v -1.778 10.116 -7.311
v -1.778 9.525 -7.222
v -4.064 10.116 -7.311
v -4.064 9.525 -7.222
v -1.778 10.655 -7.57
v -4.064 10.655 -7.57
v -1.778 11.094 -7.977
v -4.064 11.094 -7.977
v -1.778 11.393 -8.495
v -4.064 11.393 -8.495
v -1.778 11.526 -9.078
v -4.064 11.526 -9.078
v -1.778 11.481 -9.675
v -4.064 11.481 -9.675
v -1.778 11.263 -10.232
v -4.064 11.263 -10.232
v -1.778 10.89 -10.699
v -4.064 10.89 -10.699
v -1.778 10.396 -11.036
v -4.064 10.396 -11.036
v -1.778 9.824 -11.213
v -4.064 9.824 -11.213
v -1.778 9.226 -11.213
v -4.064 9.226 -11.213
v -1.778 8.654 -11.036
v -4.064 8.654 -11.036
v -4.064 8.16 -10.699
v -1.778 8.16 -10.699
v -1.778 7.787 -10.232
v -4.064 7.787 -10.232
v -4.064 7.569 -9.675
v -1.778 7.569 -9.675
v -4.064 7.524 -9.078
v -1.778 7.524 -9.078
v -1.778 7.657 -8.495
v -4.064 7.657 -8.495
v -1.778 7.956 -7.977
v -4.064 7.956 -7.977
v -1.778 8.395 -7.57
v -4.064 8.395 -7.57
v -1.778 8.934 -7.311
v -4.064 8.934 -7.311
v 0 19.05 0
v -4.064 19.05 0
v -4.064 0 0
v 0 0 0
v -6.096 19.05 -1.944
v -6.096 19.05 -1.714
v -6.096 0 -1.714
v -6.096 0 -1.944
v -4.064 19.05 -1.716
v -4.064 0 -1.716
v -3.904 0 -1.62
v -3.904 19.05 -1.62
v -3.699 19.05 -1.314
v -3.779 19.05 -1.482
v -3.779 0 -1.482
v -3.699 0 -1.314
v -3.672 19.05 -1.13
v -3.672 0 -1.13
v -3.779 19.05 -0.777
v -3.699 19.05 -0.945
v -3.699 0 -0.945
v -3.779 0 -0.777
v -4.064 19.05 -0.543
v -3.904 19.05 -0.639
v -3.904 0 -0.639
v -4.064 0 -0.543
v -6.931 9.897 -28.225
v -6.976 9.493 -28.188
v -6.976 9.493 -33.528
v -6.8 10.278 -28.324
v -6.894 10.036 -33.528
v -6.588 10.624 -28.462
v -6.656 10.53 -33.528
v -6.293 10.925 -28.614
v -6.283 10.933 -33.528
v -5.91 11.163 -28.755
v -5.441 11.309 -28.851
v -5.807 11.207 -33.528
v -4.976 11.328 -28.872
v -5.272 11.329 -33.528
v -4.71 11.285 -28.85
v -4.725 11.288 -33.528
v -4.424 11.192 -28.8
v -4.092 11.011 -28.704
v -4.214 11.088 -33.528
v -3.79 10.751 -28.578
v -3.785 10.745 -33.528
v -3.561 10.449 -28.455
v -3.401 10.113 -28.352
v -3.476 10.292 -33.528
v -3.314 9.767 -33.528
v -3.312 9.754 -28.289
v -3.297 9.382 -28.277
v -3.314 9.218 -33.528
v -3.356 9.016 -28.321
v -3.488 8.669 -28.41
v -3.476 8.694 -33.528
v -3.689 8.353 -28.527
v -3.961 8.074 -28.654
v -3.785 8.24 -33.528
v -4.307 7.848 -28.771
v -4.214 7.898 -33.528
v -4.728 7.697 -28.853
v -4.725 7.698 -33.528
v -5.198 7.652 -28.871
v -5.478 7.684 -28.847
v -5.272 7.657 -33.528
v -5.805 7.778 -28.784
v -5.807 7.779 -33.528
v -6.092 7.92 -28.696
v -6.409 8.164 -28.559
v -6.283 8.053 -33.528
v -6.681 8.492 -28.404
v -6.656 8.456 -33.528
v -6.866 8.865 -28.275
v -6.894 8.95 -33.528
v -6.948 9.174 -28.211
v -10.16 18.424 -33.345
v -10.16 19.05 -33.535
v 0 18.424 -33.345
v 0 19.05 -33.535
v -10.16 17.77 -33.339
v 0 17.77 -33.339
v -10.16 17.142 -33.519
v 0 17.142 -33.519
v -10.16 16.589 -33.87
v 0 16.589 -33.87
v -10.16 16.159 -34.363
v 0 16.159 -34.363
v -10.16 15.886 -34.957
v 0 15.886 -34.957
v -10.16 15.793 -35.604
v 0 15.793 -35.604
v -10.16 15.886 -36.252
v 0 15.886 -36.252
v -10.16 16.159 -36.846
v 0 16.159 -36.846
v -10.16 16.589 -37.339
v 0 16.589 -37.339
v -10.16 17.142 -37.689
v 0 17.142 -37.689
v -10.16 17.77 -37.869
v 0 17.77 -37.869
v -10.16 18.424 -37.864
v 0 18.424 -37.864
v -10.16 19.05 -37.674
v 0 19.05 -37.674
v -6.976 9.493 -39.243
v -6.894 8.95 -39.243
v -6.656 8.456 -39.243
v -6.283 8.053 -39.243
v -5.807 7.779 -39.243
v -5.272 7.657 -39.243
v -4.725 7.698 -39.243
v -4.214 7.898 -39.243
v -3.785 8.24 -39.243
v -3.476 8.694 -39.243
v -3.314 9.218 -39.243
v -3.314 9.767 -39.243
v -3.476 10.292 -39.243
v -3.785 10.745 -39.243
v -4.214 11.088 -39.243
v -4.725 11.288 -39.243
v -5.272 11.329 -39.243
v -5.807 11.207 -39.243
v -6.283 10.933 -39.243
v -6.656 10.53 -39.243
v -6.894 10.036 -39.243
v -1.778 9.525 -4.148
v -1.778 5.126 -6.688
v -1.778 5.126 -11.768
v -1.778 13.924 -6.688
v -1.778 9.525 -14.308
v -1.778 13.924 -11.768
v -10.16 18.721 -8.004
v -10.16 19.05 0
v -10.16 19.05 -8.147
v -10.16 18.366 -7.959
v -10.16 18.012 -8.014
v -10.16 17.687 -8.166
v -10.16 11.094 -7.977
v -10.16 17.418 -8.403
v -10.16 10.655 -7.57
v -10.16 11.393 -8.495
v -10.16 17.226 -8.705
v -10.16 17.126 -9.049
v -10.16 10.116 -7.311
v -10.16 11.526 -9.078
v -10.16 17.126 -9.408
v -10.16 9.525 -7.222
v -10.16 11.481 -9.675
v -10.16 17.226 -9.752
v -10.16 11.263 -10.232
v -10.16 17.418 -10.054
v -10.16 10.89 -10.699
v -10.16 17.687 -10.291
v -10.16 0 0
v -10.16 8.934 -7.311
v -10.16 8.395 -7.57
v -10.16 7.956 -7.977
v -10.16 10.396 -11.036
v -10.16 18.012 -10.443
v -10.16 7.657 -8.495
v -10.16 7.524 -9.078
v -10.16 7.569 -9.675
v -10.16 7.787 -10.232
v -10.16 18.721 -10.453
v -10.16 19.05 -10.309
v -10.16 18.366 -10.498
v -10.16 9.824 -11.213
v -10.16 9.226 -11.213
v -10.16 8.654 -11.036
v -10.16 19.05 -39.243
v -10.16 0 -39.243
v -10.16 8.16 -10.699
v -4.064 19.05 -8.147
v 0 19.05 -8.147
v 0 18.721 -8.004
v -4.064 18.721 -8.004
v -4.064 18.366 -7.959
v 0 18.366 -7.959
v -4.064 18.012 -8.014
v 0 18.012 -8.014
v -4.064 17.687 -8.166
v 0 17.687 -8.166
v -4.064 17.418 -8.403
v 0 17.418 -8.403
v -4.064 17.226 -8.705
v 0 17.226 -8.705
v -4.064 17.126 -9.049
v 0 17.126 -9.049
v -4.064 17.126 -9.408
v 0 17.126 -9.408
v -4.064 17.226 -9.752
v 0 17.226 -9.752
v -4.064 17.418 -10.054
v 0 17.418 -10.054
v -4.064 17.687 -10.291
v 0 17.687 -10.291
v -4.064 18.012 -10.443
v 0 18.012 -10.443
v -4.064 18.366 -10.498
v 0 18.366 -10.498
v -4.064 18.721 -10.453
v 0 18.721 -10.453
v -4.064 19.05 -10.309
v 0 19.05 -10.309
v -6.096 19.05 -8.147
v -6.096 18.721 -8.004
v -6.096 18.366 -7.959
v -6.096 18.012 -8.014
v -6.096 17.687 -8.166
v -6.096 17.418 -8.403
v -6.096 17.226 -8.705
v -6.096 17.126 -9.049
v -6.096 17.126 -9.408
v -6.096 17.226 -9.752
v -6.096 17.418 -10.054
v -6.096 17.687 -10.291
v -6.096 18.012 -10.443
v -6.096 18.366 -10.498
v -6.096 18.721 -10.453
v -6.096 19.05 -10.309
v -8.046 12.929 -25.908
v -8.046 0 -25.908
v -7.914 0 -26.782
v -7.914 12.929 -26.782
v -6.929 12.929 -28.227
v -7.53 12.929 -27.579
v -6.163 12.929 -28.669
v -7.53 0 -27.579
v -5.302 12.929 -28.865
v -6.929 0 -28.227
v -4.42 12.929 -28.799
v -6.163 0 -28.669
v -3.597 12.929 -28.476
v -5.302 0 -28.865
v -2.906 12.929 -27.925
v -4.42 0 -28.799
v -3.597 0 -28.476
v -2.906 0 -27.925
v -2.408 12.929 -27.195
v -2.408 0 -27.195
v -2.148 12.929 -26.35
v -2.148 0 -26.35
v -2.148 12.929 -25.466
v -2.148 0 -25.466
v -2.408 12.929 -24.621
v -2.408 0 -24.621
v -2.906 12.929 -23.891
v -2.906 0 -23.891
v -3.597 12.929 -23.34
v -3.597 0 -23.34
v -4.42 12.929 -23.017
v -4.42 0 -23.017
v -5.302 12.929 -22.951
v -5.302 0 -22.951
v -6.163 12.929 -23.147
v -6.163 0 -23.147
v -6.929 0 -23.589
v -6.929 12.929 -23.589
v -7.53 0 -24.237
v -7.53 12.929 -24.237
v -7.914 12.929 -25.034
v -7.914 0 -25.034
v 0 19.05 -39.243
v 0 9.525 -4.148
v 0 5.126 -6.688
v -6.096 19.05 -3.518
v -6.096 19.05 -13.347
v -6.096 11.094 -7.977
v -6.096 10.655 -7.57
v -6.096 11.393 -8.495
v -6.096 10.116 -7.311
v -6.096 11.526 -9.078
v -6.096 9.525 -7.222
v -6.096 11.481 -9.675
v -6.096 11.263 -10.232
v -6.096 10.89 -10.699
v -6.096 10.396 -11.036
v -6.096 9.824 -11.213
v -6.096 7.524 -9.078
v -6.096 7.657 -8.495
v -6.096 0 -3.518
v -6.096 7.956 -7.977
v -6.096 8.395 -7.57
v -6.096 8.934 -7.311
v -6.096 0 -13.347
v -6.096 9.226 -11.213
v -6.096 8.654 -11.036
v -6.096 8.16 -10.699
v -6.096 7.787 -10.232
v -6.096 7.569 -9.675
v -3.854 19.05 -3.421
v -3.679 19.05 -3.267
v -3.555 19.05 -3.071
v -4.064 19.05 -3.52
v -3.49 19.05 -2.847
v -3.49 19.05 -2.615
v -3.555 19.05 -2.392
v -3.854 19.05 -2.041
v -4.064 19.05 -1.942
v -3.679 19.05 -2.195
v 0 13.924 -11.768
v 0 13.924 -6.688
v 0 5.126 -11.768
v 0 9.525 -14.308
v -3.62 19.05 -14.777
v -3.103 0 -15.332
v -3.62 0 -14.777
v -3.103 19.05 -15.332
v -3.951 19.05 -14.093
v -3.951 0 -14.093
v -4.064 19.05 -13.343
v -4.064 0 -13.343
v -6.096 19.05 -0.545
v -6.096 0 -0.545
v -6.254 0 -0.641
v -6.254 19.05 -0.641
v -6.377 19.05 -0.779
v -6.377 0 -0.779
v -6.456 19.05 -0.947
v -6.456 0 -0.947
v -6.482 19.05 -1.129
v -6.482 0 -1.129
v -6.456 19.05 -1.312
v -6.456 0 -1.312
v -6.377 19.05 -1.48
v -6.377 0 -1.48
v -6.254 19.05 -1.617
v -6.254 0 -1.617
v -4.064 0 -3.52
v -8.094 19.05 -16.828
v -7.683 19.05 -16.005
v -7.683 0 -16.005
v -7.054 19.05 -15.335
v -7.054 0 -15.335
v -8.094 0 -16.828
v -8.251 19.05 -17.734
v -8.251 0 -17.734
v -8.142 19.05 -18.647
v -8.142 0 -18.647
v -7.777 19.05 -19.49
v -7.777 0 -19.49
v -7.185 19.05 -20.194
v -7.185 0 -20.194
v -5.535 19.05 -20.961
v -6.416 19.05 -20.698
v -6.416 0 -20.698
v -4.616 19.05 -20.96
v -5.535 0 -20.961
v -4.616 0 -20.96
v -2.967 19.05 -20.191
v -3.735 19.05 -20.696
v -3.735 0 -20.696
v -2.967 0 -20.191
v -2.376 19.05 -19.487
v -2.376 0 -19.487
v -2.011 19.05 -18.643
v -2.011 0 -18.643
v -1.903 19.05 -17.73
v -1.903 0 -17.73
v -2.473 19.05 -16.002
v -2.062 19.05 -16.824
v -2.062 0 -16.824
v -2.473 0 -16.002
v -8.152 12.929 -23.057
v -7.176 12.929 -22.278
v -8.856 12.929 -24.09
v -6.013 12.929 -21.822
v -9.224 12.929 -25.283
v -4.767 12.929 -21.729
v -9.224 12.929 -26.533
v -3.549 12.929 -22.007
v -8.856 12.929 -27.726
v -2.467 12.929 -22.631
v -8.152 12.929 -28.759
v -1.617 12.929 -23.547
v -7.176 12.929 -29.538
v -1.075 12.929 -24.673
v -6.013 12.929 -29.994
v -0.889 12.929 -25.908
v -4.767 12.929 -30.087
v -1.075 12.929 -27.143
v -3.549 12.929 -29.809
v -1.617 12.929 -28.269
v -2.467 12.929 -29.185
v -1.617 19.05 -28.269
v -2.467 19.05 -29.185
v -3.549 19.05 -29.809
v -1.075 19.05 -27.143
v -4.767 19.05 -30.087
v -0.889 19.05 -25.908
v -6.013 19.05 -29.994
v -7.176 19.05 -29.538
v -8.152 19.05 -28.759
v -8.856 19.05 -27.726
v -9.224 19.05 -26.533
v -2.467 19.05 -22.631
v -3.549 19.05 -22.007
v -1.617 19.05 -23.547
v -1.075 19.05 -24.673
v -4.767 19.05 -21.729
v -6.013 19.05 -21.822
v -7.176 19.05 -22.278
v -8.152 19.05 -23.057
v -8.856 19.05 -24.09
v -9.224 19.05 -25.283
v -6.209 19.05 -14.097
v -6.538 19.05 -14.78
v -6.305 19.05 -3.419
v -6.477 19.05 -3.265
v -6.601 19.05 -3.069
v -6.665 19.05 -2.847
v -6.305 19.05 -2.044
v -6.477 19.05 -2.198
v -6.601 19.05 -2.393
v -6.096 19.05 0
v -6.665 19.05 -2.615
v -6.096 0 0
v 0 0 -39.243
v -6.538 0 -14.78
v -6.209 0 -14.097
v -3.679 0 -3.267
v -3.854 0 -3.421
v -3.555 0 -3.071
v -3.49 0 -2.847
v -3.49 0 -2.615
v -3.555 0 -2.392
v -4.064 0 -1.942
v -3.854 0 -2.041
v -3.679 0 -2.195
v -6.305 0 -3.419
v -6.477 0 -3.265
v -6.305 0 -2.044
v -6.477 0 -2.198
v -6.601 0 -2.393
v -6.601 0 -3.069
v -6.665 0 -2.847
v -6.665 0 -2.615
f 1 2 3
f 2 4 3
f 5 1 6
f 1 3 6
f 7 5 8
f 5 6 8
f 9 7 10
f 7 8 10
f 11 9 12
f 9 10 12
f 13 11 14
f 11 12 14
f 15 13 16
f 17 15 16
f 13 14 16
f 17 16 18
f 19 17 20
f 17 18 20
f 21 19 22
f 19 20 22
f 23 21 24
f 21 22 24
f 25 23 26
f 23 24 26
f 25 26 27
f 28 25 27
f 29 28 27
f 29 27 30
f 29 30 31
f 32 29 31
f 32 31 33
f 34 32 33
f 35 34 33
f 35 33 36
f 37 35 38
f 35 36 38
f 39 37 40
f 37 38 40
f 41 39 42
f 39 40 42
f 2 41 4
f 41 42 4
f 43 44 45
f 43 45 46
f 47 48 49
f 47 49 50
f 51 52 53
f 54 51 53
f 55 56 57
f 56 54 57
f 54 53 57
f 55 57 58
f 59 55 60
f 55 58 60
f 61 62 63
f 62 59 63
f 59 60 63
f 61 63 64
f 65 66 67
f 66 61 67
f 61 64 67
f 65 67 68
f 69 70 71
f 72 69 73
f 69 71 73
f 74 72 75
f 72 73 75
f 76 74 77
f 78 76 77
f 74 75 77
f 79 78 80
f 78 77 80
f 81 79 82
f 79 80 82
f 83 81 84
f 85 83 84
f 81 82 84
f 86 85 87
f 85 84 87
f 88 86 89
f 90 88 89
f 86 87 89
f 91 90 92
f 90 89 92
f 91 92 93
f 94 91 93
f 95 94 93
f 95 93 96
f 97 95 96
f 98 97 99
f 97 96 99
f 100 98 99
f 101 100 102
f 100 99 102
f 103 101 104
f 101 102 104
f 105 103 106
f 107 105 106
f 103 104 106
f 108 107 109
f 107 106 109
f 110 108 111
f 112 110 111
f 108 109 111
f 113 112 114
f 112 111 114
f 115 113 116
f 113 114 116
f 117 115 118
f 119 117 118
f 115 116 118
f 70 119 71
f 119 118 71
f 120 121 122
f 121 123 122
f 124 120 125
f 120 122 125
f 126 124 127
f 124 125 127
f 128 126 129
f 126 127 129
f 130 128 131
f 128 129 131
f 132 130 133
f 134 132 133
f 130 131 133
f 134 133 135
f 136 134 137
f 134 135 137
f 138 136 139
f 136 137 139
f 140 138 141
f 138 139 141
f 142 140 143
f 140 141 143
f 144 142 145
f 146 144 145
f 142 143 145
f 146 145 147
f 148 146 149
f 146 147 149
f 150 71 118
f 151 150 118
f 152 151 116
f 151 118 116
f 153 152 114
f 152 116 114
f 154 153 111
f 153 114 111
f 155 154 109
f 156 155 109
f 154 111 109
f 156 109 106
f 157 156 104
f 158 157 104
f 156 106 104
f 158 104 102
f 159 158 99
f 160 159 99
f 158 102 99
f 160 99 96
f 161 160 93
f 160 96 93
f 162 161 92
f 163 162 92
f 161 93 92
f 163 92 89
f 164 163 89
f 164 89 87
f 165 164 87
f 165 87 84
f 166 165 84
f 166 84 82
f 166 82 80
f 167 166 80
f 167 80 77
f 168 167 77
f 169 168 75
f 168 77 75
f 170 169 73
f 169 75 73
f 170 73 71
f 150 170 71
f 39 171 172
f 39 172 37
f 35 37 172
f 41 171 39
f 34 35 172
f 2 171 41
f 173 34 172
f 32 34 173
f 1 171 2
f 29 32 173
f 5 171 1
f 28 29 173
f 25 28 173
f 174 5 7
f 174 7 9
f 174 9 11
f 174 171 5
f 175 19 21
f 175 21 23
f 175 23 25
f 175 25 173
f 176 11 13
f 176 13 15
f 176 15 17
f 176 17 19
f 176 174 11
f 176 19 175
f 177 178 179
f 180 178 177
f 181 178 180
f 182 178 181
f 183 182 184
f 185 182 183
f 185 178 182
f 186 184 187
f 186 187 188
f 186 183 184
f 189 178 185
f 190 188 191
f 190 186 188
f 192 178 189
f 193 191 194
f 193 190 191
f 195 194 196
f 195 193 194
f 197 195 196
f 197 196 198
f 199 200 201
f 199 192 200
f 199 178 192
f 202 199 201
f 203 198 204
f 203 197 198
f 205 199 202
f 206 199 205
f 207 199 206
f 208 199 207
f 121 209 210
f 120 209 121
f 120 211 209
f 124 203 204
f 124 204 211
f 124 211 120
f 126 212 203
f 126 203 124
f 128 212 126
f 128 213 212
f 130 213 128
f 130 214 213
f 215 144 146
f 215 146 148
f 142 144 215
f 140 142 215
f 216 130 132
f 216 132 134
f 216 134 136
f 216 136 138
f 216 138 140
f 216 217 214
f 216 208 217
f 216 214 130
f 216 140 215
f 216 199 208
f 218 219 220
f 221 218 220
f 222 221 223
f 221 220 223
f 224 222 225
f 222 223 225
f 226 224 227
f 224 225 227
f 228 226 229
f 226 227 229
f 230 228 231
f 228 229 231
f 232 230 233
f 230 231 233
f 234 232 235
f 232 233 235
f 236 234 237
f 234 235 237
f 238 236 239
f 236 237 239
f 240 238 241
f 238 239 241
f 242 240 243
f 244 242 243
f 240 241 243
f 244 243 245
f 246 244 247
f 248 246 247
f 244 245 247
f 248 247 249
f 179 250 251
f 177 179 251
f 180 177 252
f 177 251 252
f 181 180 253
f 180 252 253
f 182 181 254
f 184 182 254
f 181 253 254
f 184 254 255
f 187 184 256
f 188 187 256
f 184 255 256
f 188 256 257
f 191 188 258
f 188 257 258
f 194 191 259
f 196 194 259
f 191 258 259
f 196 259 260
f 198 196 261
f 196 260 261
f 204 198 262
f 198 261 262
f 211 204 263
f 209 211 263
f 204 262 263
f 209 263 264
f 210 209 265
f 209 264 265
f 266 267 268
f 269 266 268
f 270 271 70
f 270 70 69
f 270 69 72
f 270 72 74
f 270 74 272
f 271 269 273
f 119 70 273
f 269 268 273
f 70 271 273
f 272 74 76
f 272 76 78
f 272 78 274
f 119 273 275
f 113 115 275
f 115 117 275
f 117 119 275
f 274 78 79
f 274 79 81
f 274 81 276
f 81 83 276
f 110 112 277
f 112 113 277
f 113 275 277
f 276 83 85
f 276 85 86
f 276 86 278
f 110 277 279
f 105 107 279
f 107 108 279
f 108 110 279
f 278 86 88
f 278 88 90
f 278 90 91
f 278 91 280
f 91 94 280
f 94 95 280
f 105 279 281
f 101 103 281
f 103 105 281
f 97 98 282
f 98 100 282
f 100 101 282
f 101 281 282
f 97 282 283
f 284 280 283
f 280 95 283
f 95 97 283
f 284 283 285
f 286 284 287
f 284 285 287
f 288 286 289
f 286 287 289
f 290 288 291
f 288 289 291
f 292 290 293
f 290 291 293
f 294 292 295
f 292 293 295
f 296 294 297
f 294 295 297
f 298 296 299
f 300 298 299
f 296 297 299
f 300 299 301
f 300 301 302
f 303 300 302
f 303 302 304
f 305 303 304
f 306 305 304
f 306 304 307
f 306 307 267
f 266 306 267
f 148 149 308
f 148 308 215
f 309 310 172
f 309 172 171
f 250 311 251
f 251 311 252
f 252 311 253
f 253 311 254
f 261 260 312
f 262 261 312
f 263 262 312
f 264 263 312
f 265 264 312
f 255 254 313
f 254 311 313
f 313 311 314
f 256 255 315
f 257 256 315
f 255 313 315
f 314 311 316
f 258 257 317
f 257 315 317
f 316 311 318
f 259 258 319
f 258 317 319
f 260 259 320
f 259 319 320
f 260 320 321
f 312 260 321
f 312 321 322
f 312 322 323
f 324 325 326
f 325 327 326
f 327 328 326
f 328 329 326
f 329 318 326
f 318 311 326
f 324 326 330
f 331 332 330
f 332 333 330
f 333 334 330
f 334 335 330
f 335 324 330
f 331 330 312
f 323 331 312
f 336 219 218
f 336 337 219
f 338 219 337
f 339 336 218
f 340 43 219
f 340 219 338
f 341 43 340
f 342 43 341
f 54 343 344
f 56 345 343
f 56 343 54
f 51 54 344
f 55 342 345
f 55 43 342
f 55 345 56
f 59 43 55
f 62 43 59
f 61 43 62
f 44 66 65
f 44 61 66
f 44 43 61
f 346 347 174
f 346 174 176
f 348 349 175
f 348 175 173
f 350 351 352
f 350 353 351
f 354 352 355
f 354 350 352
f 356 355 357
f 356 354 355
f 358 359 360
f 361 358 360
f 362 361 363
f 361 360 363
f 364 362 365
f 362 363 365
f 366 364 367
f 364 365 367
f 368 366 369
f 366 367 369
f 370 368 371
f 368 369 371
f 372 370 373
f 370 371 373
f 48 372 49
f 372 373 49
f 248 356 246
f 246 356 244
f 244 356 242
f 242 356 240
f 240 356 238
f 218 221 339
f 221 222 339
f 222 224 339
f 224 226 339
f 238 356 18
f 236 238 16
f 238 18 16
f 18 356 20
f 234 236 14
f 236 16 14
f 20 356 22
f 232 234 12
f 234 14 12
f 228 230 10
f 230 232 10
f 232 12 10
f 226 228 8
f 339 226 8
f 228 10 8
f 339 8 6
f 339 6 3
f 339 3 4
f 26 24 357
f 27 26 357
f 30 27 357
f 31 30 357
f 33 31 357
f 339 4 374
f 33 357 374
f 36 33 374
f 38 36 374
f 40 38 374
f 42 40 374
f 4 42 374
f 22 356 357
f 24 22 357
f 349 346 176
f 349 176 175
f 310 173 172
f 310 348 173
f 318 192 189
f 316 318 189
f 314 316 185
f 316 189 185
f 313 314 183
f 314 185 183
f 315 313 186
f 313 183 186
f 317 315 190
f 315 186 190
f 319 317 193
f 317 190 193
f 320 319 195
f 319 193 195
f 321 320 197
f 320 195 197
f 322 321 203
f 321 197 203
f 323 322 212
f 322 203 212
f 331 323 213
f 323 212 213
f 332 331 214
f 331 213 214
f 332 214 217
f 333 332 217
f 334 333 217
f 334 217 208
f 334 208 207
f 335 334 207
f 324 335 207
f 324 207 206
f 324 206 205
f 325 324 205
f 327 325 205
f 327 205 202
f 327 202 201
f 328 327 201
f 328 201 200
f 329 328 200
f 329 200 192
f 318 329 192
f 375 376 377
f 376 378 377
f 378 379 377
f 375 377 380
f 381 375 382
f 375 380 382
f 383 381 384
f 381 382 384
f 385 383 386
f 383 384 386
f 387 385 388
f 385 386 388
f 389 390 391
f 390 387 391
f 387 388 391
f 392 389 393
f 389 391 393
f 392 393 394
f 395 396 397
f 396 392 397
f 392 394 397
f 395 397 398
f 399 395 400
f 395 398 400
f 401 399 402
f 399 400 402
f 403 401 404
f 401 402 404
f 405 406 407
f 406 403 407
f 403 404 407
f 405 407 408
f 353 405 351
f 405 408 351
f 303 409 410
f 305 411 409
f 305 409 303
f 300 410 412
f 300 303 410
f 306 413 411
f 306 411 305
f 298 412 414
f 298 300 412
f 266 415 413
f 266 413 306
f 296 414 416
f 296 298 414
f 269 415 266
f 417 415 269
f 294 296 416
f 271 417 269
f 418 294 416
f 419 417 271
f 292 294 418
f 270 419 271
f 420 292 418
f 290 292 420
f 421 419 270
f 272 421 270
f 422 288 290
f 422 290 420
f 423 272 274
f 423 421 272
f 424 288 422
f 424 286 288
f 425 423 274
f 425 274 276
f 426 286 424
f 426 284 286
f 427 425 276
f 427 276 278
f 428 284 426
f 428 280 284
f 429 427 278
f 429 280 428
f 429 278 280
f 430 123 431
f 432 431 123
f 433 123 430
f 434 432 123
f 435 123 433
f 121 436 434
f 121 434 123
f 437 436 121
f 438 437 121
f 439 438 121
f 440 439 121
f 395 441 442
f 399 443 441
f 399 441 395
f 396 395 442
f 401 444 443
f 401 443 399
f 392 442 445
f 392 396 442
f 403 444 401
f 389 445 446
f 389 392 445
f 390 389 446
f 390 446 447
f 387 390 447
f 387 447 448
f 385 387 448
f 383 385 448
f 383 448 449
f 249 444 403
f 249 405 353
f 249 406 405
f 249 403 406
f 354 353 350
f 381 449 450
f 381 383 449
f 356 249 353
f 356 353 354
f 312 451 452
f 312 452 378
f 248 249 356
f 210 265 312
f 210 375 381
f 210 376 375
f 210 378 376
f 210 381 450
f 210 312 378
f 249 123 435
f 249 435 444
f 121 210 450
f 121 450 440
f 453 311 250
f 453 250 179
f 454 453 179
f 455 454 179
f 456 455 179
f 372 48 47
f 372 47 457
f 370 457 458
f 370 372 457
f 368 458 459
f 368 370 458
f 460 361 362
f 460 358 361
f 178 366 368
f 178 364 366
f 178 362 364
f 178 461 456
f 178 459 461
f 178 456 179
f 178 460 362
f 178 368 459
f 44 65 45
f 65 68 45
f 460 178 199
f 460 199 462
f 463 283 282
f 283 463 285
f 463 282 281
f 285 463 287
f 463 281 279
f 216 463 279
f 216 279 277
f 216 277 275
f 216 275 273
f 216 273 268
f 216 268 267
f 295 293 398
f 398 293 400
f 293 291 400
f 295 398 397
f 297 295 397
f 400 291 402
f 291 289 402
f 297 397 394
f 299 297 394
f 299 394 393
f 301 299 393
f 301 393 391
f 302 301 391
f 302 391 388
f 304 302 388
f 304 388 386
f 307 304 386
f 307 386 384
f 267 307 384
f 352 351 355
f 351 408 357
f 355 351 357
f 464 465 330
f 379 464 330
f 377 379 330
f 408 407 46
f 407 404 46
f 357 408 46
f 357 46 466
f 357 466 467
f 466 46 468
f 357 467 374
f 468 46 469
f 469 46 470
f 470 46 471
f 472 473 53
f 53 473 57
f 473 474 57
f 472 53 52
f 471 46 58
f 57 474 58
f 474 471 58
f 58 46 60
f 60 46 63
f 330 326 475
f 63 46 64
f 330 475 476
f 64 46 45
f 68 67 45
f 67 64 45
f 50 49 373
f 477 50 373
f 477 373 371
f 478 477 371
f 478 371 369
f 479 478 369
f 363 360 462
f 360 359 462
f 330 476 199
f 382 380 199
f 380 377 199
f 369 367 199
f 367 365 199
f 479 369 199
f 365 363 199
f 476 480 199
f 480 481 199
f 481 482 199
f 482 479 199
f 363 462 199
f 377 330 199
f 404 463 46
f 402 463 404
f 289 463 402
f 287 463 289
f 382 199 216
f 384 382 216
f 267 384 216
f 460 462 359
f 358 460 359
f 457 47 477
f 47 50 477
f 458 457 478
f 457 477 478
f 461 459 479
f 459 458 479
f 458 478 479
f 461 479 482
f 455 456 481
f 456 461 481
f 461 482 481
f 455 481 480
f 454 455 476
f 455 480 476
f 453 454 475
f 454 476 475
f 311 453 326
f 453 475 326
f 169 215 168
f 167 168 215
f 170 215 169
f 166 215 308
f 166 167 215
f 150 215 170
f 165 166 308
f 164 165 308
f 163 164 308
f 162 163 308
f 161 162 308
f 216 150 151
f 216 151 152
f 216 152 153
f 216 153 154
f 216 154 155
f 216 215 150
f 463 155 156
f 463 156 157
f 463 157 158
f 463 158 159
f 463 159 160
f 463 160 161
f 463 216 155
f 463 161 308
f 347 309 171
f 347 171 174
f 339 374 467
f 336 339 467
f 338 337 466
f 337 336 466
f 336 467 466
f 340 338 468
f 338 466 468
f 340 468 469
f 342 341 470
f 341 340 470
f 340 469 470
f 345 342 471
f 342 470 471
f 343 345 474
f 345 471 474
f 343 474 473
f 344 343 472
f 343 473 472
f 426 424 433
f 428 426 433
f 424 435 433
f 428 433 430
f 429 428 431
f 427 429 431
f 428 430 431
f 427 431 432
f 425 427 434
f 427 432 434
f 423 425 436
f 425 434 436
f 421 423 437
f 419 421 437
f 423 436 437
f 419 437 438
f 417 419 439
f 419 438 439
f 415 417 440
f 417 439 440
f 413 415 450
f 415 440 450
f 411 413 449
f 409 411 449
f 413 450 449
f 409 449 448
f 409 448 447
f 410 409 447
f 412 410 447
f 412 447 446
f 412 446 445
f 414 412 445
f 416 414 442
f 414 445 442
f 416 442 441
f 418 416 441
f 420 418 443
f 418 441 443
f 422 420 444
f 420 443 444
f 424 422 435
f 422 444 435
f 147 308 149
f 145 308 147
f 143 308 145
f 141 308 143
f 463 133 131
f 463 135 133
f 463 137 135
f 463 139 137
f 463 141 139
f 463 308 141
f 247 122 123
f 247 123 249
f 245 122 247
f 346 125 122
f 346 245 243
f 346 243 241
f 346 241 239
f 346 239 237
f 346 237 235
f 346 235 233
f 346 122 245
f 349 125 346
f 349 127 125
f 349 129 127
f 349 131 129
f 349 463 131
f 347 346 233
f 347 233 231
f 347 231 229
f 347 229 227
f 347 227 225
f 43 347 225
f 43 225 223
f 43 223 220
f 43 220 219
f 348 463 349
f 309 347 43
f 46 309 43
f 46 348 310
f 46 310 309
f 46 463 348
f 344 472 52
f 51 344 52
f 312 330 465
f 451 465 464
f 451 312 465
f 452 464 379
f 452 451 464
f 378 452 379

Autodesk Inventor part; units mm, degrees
ref_plane "YZ Plane" through (0, 0, 0) normal (1, 0, 0) x (0, 1, 0)
ref_plane "XZ Plane" through (0, 0, 0) normal (0, 1, 0) x (-1, 0, 0)
ref_plane "XY Plane" through (0, 0, 0) normal (0, 0, 1) x (1, 0, 0)
sketch "Sketch1" plane through (0, 0, 0) normal (0, 1, 0) x (-1, 0, 0)
  line L0 (10.16, 0) -> (10.16, -36.068)
  line L1 (0, -36.068) -> (0, 0) construction
  circle A0 centre (5.08, -25.908) radius 2.9655
  line L2 (10.16, 0) -> (6.096, 0) construction
  line L3 (3.9775, 0) -> (0.0978, 0) construction
  line L4 (4.064, -3.81) -> (4.064, -14.8101) construction
  arc A1 (4.064, -14.8101) -> (6.096, -14.812) centre (5.0772, -17.8191) ccw
  line L5 (5.08, -31.75) -> (24.746, -31.75) construction
  line L6 (0, -4.7834) -> (2.794, -4.7834) construction
  line L7 (2.794, -4.7834) -> (2.794, -13.6734) construction
  line L8 (2.794, -13.6734) -> (0, -13.6734) construction
  line L9 (0, -13.6734) -> (0, -4.7834) construction
  line L10 (4.064, -4.7834) -> (0, -4.7834) construction
  line L11 (5.08, -31.75) -> (9.398, -31.75) construction
  line L12 (10.16, 0) -> (6.096, 0)
  line L13 (4.064, 0) -> (0, 0)
  line L14 (0, 0) -> (0, -36.068)
  line L15 (5.08, -36.068) -> (8.255, -36.068) construction
  line L16 (10.16, -36.068) -> (10.16, -39.243)
  line L17 (10.16, -39.243) -> (0, -39.243)
  line L18 (0, -39.243) -> (0, -36.068)
  line L19 (5.0772, -17.8191) -> (26.8769, -17.8191) construction
  arc A2 (4.064, -0.5428) -> (4.064, -1.7162) centre (4.307, -1.1295) ccw
  line L20 (4.064, -0.5428) -> (4.064, 0)
  arc A3 (4.064, -1.9422) -> (4.064, -3.5201) centre (4.307, -2.7311) ccw
  line L21 (4.064, -14.8101) -> (4.064, -3.5201)
  line L22 (4.064, -1.9422) -> (4.064, -1.7162)
  line L23 (4.064, -3.5201) -> (4.064, -3.81) construction
  line L24 (4.064, 0) -> (4.064, -0.5428) construction
  line L25 (4.064, -1.7162) -> (4.064, -1.9422) construction
  arc A4 (6.0904, -1.7162) -> (6.0904, -0.5428) centre (5.8475, -1.1295) ccw
  arc A5 (6.0904, -3.5201) -> (6.0904, -1.9422) centre (5.8475, -2.7311) ccw
  line L26 (6.096, -0.5451) -> (6.096, 0) construction
  line L27 (6.096, -3.5183) -> (6.096, -14.812)
  line L28 (6.096, 0) -> (6.096, -0.5451)
  line L29 (6.096, -1.7138) -> (6.096, -1.9439)
  line L30 (6.096, -3.81) -> (6.096, -3.5183) construction
  line L31 (6.096, -1.9439) -> (6.096, -1.7138) construction
  dimension "d0" = 10.16
  dimension "d3" = 5.9309
  dimension "d11" = 25.908
  dimension "d18" = 6.35
  dimension "d20" = 8.89
  dimension "d21" = 2.794
extrude "Extrusion1" add sketch "Sketch1" along normal blind 19.05
sketch "Sketch2" plane through (0, 0, 0) normal (1, 0, 0) x (0, 0, -1)
  line L0 (39.243, 0) -> (0, 0) construction
  line L1 (0, 19.05) -> (39.243, 19.05) construction
  line L2 (0, 0) -> (0, 19.05) construction
  line L3 (36.068, 9.525) -> (0, 9.525) construction
  line L4 (20.9941, 0) -> (14.812, 0) construction
  line L5 (3.81, 19.05) -> (14.812, 19.05) construction
  line L6 (14.6467, 0) -> (3.81, 0) construction
  line L7 (14.6467, 0) -> (14.6467, 19.05) construction
  line L8 (3.81, 19.05) -> (14.6467, 19.05) construction
  line L9 (3.81, 0) -> (3.81, 19.05) construction
  line L10 (14.6467, 9.525) -> (3.81, 9.525) construction
  circle A0 centre (9.2284, 9.525) radius 1.8542
  line L11 (39.243, 0) -> (39.243, 19.05) projected
  point P0 (14.8101, 0)
  dimension "d26" = 3.7084
extrude "Extrusion2" cut sketch "Sketch2" against normal blind 19.05
sketch "Sketch3" plane through (0, 19.05, 0) normal (0, 1, 0) x (1, 0, 0)
  line L0 (0, 11.0826) -> (0, 7.3742) projected
  point P0 (0, 0)
sketch "Sketch4" plane through (0, 0, 0) normal (1, 0, 0) x (0, 0, -1)
  circle A0 centre (9.2284, 9.525) radius 1.8542 projected
  line L0 (39.243, 0) -> (0, 0) projected
  line L1 (0, 19.05) -> (39.243, 19.05) projected
  line L2 (0, 0) -> (0, 19.05) projected
  line L3 (14.3084, 9.525) -> (11.7684, 5.1256)
  line L4 (11.7684, 5.1256) -> (6.6884, 5.1256)
  line L5 (6.6884, 5.1256) -> (4.1484, 9.525)
  line L6 (4.1484, 9.525) -> (6.6884, 13.9244)
  line L7 (6.6884, 13.9244) -> (11.7684, 13.9244)
  line L8 (11.7684, 13.9244) -> (14.3084, 9.525)
  line L9 (39.243, 0) -> (39.243, 19.05) projected
  dimension "d30" = 10.16
extrude "Extrusion3" cut sketch "Sketch4" against normal blind 1.778 contours L3 L4 L5 L6 L7 L8
ref_plane "Work Plane1" through (0, 0, -33.528) normal (0, 0, -1) x (-1, 0, 0)
sketch "Sketch6" plane through (0, 0, -33.528) normal (0, 0, -1) x (-1, 0, 0)
  line L0 (0.508, 9.5571) -> (2.8218, 13.5005) projected
  line L1 (7.3938, 13.4684) -> (9.652, 9.4929) projected
  line L2 (2.8218, 13.5005) -> (7.3938, 13.4684) projected
  line L3 (0.508, 9.5571) -> (2.8218, 13.5005) projected
  line L4 (2.7662, 5.5816) -> (0.508, 9.5571) projected
  line L5 (7.3382, 5.5495) -> (2.7662, 5.5816) projected
  line L6 (9.652, 9.4929) -> (7.3382, 5.5495) projected
  circle A0 centre (5.1347, 9.4929) radius 4.5726
  circle A1 centre (5.1347, 9.4929) radius 1.8415
  point P0 (0, 0)
  dimension "d38" = 3.683
extrude "Extrusion5" cut sketch "Sketch6" along normal mid plane 12.7 contours A1
sketch "Sketch7" plane through (0, 0, 0) normal (1, 0, 0) x (0, 0, -1)
  line L0 (3.81, 19.05) -> (14.812, 19.05) projected
  circle A0 centre (9.2284, 18.3833) radius 1.27
  line L1 (0, 19.05) -> (39.243, 19.05) projected
  line L2 (6.8407, 19.05) -> (6.8407, 19.558)
  line L3 (6.8407, 19.05) -> (7.3487, 19.05) construction
  line L4 (7.3243, 18.5023) -> (7.3243, 18.3436)
  line L5 (7.3243, 18.5023) -> (7.4831, 18.5023) construction
  line L6 (22.9425, 19.05) -> (28.8734, 19.05) projected
  line L7 (28.8734, 0) -> (22.9425, 0) projected
  line L8 (28.8734, 0) -> (28.8734, 19.05) projected
  line L9 (28.8734, 9.525) -> (35.9855, 9.525)
  line L10 (35.9855, 9.525) -> (32.4294, 9.525)
  circle A1 centre (35.6044, 18.0788) radius 2.286
  line L11 (32.4294, 9.525) -> (32.4294, 7.6962)
  line L12 (32.4294, 7.6962) -> (32.4294, 4.5212)
  line L13 (28.8729, 7.6514) -> (39.243, 7.6514) projected
  line L14 (32.4294, 7.6962) -> (35.6044, 7.6962) construction
  line L15 (32.4294, 4.5212) -> (35.6044, 4.5212)
  point P0 (0, 0)
  point P1 (36.068, 19.05)
  point P2 (28.188, 9.4929)
  dimension "d41" = 2.54
  dimension "d42" = 0.508
  dimension "d43" = 90
  dimension "d46" = 0.1588
  dimension "d47" = 90
  dimension "d48" = 4.572
  dimension "d49" = 1.8288
  dimension "d56" = 3.175
  dimension "d57" = 90
  dimension "d58" = 3.175
  dimension "d59" = 90
extrude "Extrusion6" cut sketch "Sketch7" against normal blind 55.88 contours A0 L0 | A1 L1 | L1 A1 | L0 A0
sketch "Sketch8" plane through (0, 19.05, 0) normal (0, 1, 0) x (1, 0, 0)
  circle A0 centre (-5.08, 25.908) radius 4.191
  point P0 (0, 0)
  dimension "d50" = 8.382
extrude "Extrusion7" cut sketch "Sketch8" against normal blind 6.1214
fillet "Fillet1" radius 2.54 2 edges at (-6.096, 9.525, -14.812) (-4.064, 9.525, -14.8101)
sketch "Sketch9" plane through (-10.16, 0, -39.243) normal (-1, 0, 0) x (0, 0, 1)
  circle A0 centre (30.0146, 9.525) radius 2.0066
  point P0 (39.243, 0)
  dimension "d61" = 4.0132
extrude "Extrusion8" cut sketch "Sketch9" against normal blind 12.7
properties part number "Neuroprobeholdermagiger"
